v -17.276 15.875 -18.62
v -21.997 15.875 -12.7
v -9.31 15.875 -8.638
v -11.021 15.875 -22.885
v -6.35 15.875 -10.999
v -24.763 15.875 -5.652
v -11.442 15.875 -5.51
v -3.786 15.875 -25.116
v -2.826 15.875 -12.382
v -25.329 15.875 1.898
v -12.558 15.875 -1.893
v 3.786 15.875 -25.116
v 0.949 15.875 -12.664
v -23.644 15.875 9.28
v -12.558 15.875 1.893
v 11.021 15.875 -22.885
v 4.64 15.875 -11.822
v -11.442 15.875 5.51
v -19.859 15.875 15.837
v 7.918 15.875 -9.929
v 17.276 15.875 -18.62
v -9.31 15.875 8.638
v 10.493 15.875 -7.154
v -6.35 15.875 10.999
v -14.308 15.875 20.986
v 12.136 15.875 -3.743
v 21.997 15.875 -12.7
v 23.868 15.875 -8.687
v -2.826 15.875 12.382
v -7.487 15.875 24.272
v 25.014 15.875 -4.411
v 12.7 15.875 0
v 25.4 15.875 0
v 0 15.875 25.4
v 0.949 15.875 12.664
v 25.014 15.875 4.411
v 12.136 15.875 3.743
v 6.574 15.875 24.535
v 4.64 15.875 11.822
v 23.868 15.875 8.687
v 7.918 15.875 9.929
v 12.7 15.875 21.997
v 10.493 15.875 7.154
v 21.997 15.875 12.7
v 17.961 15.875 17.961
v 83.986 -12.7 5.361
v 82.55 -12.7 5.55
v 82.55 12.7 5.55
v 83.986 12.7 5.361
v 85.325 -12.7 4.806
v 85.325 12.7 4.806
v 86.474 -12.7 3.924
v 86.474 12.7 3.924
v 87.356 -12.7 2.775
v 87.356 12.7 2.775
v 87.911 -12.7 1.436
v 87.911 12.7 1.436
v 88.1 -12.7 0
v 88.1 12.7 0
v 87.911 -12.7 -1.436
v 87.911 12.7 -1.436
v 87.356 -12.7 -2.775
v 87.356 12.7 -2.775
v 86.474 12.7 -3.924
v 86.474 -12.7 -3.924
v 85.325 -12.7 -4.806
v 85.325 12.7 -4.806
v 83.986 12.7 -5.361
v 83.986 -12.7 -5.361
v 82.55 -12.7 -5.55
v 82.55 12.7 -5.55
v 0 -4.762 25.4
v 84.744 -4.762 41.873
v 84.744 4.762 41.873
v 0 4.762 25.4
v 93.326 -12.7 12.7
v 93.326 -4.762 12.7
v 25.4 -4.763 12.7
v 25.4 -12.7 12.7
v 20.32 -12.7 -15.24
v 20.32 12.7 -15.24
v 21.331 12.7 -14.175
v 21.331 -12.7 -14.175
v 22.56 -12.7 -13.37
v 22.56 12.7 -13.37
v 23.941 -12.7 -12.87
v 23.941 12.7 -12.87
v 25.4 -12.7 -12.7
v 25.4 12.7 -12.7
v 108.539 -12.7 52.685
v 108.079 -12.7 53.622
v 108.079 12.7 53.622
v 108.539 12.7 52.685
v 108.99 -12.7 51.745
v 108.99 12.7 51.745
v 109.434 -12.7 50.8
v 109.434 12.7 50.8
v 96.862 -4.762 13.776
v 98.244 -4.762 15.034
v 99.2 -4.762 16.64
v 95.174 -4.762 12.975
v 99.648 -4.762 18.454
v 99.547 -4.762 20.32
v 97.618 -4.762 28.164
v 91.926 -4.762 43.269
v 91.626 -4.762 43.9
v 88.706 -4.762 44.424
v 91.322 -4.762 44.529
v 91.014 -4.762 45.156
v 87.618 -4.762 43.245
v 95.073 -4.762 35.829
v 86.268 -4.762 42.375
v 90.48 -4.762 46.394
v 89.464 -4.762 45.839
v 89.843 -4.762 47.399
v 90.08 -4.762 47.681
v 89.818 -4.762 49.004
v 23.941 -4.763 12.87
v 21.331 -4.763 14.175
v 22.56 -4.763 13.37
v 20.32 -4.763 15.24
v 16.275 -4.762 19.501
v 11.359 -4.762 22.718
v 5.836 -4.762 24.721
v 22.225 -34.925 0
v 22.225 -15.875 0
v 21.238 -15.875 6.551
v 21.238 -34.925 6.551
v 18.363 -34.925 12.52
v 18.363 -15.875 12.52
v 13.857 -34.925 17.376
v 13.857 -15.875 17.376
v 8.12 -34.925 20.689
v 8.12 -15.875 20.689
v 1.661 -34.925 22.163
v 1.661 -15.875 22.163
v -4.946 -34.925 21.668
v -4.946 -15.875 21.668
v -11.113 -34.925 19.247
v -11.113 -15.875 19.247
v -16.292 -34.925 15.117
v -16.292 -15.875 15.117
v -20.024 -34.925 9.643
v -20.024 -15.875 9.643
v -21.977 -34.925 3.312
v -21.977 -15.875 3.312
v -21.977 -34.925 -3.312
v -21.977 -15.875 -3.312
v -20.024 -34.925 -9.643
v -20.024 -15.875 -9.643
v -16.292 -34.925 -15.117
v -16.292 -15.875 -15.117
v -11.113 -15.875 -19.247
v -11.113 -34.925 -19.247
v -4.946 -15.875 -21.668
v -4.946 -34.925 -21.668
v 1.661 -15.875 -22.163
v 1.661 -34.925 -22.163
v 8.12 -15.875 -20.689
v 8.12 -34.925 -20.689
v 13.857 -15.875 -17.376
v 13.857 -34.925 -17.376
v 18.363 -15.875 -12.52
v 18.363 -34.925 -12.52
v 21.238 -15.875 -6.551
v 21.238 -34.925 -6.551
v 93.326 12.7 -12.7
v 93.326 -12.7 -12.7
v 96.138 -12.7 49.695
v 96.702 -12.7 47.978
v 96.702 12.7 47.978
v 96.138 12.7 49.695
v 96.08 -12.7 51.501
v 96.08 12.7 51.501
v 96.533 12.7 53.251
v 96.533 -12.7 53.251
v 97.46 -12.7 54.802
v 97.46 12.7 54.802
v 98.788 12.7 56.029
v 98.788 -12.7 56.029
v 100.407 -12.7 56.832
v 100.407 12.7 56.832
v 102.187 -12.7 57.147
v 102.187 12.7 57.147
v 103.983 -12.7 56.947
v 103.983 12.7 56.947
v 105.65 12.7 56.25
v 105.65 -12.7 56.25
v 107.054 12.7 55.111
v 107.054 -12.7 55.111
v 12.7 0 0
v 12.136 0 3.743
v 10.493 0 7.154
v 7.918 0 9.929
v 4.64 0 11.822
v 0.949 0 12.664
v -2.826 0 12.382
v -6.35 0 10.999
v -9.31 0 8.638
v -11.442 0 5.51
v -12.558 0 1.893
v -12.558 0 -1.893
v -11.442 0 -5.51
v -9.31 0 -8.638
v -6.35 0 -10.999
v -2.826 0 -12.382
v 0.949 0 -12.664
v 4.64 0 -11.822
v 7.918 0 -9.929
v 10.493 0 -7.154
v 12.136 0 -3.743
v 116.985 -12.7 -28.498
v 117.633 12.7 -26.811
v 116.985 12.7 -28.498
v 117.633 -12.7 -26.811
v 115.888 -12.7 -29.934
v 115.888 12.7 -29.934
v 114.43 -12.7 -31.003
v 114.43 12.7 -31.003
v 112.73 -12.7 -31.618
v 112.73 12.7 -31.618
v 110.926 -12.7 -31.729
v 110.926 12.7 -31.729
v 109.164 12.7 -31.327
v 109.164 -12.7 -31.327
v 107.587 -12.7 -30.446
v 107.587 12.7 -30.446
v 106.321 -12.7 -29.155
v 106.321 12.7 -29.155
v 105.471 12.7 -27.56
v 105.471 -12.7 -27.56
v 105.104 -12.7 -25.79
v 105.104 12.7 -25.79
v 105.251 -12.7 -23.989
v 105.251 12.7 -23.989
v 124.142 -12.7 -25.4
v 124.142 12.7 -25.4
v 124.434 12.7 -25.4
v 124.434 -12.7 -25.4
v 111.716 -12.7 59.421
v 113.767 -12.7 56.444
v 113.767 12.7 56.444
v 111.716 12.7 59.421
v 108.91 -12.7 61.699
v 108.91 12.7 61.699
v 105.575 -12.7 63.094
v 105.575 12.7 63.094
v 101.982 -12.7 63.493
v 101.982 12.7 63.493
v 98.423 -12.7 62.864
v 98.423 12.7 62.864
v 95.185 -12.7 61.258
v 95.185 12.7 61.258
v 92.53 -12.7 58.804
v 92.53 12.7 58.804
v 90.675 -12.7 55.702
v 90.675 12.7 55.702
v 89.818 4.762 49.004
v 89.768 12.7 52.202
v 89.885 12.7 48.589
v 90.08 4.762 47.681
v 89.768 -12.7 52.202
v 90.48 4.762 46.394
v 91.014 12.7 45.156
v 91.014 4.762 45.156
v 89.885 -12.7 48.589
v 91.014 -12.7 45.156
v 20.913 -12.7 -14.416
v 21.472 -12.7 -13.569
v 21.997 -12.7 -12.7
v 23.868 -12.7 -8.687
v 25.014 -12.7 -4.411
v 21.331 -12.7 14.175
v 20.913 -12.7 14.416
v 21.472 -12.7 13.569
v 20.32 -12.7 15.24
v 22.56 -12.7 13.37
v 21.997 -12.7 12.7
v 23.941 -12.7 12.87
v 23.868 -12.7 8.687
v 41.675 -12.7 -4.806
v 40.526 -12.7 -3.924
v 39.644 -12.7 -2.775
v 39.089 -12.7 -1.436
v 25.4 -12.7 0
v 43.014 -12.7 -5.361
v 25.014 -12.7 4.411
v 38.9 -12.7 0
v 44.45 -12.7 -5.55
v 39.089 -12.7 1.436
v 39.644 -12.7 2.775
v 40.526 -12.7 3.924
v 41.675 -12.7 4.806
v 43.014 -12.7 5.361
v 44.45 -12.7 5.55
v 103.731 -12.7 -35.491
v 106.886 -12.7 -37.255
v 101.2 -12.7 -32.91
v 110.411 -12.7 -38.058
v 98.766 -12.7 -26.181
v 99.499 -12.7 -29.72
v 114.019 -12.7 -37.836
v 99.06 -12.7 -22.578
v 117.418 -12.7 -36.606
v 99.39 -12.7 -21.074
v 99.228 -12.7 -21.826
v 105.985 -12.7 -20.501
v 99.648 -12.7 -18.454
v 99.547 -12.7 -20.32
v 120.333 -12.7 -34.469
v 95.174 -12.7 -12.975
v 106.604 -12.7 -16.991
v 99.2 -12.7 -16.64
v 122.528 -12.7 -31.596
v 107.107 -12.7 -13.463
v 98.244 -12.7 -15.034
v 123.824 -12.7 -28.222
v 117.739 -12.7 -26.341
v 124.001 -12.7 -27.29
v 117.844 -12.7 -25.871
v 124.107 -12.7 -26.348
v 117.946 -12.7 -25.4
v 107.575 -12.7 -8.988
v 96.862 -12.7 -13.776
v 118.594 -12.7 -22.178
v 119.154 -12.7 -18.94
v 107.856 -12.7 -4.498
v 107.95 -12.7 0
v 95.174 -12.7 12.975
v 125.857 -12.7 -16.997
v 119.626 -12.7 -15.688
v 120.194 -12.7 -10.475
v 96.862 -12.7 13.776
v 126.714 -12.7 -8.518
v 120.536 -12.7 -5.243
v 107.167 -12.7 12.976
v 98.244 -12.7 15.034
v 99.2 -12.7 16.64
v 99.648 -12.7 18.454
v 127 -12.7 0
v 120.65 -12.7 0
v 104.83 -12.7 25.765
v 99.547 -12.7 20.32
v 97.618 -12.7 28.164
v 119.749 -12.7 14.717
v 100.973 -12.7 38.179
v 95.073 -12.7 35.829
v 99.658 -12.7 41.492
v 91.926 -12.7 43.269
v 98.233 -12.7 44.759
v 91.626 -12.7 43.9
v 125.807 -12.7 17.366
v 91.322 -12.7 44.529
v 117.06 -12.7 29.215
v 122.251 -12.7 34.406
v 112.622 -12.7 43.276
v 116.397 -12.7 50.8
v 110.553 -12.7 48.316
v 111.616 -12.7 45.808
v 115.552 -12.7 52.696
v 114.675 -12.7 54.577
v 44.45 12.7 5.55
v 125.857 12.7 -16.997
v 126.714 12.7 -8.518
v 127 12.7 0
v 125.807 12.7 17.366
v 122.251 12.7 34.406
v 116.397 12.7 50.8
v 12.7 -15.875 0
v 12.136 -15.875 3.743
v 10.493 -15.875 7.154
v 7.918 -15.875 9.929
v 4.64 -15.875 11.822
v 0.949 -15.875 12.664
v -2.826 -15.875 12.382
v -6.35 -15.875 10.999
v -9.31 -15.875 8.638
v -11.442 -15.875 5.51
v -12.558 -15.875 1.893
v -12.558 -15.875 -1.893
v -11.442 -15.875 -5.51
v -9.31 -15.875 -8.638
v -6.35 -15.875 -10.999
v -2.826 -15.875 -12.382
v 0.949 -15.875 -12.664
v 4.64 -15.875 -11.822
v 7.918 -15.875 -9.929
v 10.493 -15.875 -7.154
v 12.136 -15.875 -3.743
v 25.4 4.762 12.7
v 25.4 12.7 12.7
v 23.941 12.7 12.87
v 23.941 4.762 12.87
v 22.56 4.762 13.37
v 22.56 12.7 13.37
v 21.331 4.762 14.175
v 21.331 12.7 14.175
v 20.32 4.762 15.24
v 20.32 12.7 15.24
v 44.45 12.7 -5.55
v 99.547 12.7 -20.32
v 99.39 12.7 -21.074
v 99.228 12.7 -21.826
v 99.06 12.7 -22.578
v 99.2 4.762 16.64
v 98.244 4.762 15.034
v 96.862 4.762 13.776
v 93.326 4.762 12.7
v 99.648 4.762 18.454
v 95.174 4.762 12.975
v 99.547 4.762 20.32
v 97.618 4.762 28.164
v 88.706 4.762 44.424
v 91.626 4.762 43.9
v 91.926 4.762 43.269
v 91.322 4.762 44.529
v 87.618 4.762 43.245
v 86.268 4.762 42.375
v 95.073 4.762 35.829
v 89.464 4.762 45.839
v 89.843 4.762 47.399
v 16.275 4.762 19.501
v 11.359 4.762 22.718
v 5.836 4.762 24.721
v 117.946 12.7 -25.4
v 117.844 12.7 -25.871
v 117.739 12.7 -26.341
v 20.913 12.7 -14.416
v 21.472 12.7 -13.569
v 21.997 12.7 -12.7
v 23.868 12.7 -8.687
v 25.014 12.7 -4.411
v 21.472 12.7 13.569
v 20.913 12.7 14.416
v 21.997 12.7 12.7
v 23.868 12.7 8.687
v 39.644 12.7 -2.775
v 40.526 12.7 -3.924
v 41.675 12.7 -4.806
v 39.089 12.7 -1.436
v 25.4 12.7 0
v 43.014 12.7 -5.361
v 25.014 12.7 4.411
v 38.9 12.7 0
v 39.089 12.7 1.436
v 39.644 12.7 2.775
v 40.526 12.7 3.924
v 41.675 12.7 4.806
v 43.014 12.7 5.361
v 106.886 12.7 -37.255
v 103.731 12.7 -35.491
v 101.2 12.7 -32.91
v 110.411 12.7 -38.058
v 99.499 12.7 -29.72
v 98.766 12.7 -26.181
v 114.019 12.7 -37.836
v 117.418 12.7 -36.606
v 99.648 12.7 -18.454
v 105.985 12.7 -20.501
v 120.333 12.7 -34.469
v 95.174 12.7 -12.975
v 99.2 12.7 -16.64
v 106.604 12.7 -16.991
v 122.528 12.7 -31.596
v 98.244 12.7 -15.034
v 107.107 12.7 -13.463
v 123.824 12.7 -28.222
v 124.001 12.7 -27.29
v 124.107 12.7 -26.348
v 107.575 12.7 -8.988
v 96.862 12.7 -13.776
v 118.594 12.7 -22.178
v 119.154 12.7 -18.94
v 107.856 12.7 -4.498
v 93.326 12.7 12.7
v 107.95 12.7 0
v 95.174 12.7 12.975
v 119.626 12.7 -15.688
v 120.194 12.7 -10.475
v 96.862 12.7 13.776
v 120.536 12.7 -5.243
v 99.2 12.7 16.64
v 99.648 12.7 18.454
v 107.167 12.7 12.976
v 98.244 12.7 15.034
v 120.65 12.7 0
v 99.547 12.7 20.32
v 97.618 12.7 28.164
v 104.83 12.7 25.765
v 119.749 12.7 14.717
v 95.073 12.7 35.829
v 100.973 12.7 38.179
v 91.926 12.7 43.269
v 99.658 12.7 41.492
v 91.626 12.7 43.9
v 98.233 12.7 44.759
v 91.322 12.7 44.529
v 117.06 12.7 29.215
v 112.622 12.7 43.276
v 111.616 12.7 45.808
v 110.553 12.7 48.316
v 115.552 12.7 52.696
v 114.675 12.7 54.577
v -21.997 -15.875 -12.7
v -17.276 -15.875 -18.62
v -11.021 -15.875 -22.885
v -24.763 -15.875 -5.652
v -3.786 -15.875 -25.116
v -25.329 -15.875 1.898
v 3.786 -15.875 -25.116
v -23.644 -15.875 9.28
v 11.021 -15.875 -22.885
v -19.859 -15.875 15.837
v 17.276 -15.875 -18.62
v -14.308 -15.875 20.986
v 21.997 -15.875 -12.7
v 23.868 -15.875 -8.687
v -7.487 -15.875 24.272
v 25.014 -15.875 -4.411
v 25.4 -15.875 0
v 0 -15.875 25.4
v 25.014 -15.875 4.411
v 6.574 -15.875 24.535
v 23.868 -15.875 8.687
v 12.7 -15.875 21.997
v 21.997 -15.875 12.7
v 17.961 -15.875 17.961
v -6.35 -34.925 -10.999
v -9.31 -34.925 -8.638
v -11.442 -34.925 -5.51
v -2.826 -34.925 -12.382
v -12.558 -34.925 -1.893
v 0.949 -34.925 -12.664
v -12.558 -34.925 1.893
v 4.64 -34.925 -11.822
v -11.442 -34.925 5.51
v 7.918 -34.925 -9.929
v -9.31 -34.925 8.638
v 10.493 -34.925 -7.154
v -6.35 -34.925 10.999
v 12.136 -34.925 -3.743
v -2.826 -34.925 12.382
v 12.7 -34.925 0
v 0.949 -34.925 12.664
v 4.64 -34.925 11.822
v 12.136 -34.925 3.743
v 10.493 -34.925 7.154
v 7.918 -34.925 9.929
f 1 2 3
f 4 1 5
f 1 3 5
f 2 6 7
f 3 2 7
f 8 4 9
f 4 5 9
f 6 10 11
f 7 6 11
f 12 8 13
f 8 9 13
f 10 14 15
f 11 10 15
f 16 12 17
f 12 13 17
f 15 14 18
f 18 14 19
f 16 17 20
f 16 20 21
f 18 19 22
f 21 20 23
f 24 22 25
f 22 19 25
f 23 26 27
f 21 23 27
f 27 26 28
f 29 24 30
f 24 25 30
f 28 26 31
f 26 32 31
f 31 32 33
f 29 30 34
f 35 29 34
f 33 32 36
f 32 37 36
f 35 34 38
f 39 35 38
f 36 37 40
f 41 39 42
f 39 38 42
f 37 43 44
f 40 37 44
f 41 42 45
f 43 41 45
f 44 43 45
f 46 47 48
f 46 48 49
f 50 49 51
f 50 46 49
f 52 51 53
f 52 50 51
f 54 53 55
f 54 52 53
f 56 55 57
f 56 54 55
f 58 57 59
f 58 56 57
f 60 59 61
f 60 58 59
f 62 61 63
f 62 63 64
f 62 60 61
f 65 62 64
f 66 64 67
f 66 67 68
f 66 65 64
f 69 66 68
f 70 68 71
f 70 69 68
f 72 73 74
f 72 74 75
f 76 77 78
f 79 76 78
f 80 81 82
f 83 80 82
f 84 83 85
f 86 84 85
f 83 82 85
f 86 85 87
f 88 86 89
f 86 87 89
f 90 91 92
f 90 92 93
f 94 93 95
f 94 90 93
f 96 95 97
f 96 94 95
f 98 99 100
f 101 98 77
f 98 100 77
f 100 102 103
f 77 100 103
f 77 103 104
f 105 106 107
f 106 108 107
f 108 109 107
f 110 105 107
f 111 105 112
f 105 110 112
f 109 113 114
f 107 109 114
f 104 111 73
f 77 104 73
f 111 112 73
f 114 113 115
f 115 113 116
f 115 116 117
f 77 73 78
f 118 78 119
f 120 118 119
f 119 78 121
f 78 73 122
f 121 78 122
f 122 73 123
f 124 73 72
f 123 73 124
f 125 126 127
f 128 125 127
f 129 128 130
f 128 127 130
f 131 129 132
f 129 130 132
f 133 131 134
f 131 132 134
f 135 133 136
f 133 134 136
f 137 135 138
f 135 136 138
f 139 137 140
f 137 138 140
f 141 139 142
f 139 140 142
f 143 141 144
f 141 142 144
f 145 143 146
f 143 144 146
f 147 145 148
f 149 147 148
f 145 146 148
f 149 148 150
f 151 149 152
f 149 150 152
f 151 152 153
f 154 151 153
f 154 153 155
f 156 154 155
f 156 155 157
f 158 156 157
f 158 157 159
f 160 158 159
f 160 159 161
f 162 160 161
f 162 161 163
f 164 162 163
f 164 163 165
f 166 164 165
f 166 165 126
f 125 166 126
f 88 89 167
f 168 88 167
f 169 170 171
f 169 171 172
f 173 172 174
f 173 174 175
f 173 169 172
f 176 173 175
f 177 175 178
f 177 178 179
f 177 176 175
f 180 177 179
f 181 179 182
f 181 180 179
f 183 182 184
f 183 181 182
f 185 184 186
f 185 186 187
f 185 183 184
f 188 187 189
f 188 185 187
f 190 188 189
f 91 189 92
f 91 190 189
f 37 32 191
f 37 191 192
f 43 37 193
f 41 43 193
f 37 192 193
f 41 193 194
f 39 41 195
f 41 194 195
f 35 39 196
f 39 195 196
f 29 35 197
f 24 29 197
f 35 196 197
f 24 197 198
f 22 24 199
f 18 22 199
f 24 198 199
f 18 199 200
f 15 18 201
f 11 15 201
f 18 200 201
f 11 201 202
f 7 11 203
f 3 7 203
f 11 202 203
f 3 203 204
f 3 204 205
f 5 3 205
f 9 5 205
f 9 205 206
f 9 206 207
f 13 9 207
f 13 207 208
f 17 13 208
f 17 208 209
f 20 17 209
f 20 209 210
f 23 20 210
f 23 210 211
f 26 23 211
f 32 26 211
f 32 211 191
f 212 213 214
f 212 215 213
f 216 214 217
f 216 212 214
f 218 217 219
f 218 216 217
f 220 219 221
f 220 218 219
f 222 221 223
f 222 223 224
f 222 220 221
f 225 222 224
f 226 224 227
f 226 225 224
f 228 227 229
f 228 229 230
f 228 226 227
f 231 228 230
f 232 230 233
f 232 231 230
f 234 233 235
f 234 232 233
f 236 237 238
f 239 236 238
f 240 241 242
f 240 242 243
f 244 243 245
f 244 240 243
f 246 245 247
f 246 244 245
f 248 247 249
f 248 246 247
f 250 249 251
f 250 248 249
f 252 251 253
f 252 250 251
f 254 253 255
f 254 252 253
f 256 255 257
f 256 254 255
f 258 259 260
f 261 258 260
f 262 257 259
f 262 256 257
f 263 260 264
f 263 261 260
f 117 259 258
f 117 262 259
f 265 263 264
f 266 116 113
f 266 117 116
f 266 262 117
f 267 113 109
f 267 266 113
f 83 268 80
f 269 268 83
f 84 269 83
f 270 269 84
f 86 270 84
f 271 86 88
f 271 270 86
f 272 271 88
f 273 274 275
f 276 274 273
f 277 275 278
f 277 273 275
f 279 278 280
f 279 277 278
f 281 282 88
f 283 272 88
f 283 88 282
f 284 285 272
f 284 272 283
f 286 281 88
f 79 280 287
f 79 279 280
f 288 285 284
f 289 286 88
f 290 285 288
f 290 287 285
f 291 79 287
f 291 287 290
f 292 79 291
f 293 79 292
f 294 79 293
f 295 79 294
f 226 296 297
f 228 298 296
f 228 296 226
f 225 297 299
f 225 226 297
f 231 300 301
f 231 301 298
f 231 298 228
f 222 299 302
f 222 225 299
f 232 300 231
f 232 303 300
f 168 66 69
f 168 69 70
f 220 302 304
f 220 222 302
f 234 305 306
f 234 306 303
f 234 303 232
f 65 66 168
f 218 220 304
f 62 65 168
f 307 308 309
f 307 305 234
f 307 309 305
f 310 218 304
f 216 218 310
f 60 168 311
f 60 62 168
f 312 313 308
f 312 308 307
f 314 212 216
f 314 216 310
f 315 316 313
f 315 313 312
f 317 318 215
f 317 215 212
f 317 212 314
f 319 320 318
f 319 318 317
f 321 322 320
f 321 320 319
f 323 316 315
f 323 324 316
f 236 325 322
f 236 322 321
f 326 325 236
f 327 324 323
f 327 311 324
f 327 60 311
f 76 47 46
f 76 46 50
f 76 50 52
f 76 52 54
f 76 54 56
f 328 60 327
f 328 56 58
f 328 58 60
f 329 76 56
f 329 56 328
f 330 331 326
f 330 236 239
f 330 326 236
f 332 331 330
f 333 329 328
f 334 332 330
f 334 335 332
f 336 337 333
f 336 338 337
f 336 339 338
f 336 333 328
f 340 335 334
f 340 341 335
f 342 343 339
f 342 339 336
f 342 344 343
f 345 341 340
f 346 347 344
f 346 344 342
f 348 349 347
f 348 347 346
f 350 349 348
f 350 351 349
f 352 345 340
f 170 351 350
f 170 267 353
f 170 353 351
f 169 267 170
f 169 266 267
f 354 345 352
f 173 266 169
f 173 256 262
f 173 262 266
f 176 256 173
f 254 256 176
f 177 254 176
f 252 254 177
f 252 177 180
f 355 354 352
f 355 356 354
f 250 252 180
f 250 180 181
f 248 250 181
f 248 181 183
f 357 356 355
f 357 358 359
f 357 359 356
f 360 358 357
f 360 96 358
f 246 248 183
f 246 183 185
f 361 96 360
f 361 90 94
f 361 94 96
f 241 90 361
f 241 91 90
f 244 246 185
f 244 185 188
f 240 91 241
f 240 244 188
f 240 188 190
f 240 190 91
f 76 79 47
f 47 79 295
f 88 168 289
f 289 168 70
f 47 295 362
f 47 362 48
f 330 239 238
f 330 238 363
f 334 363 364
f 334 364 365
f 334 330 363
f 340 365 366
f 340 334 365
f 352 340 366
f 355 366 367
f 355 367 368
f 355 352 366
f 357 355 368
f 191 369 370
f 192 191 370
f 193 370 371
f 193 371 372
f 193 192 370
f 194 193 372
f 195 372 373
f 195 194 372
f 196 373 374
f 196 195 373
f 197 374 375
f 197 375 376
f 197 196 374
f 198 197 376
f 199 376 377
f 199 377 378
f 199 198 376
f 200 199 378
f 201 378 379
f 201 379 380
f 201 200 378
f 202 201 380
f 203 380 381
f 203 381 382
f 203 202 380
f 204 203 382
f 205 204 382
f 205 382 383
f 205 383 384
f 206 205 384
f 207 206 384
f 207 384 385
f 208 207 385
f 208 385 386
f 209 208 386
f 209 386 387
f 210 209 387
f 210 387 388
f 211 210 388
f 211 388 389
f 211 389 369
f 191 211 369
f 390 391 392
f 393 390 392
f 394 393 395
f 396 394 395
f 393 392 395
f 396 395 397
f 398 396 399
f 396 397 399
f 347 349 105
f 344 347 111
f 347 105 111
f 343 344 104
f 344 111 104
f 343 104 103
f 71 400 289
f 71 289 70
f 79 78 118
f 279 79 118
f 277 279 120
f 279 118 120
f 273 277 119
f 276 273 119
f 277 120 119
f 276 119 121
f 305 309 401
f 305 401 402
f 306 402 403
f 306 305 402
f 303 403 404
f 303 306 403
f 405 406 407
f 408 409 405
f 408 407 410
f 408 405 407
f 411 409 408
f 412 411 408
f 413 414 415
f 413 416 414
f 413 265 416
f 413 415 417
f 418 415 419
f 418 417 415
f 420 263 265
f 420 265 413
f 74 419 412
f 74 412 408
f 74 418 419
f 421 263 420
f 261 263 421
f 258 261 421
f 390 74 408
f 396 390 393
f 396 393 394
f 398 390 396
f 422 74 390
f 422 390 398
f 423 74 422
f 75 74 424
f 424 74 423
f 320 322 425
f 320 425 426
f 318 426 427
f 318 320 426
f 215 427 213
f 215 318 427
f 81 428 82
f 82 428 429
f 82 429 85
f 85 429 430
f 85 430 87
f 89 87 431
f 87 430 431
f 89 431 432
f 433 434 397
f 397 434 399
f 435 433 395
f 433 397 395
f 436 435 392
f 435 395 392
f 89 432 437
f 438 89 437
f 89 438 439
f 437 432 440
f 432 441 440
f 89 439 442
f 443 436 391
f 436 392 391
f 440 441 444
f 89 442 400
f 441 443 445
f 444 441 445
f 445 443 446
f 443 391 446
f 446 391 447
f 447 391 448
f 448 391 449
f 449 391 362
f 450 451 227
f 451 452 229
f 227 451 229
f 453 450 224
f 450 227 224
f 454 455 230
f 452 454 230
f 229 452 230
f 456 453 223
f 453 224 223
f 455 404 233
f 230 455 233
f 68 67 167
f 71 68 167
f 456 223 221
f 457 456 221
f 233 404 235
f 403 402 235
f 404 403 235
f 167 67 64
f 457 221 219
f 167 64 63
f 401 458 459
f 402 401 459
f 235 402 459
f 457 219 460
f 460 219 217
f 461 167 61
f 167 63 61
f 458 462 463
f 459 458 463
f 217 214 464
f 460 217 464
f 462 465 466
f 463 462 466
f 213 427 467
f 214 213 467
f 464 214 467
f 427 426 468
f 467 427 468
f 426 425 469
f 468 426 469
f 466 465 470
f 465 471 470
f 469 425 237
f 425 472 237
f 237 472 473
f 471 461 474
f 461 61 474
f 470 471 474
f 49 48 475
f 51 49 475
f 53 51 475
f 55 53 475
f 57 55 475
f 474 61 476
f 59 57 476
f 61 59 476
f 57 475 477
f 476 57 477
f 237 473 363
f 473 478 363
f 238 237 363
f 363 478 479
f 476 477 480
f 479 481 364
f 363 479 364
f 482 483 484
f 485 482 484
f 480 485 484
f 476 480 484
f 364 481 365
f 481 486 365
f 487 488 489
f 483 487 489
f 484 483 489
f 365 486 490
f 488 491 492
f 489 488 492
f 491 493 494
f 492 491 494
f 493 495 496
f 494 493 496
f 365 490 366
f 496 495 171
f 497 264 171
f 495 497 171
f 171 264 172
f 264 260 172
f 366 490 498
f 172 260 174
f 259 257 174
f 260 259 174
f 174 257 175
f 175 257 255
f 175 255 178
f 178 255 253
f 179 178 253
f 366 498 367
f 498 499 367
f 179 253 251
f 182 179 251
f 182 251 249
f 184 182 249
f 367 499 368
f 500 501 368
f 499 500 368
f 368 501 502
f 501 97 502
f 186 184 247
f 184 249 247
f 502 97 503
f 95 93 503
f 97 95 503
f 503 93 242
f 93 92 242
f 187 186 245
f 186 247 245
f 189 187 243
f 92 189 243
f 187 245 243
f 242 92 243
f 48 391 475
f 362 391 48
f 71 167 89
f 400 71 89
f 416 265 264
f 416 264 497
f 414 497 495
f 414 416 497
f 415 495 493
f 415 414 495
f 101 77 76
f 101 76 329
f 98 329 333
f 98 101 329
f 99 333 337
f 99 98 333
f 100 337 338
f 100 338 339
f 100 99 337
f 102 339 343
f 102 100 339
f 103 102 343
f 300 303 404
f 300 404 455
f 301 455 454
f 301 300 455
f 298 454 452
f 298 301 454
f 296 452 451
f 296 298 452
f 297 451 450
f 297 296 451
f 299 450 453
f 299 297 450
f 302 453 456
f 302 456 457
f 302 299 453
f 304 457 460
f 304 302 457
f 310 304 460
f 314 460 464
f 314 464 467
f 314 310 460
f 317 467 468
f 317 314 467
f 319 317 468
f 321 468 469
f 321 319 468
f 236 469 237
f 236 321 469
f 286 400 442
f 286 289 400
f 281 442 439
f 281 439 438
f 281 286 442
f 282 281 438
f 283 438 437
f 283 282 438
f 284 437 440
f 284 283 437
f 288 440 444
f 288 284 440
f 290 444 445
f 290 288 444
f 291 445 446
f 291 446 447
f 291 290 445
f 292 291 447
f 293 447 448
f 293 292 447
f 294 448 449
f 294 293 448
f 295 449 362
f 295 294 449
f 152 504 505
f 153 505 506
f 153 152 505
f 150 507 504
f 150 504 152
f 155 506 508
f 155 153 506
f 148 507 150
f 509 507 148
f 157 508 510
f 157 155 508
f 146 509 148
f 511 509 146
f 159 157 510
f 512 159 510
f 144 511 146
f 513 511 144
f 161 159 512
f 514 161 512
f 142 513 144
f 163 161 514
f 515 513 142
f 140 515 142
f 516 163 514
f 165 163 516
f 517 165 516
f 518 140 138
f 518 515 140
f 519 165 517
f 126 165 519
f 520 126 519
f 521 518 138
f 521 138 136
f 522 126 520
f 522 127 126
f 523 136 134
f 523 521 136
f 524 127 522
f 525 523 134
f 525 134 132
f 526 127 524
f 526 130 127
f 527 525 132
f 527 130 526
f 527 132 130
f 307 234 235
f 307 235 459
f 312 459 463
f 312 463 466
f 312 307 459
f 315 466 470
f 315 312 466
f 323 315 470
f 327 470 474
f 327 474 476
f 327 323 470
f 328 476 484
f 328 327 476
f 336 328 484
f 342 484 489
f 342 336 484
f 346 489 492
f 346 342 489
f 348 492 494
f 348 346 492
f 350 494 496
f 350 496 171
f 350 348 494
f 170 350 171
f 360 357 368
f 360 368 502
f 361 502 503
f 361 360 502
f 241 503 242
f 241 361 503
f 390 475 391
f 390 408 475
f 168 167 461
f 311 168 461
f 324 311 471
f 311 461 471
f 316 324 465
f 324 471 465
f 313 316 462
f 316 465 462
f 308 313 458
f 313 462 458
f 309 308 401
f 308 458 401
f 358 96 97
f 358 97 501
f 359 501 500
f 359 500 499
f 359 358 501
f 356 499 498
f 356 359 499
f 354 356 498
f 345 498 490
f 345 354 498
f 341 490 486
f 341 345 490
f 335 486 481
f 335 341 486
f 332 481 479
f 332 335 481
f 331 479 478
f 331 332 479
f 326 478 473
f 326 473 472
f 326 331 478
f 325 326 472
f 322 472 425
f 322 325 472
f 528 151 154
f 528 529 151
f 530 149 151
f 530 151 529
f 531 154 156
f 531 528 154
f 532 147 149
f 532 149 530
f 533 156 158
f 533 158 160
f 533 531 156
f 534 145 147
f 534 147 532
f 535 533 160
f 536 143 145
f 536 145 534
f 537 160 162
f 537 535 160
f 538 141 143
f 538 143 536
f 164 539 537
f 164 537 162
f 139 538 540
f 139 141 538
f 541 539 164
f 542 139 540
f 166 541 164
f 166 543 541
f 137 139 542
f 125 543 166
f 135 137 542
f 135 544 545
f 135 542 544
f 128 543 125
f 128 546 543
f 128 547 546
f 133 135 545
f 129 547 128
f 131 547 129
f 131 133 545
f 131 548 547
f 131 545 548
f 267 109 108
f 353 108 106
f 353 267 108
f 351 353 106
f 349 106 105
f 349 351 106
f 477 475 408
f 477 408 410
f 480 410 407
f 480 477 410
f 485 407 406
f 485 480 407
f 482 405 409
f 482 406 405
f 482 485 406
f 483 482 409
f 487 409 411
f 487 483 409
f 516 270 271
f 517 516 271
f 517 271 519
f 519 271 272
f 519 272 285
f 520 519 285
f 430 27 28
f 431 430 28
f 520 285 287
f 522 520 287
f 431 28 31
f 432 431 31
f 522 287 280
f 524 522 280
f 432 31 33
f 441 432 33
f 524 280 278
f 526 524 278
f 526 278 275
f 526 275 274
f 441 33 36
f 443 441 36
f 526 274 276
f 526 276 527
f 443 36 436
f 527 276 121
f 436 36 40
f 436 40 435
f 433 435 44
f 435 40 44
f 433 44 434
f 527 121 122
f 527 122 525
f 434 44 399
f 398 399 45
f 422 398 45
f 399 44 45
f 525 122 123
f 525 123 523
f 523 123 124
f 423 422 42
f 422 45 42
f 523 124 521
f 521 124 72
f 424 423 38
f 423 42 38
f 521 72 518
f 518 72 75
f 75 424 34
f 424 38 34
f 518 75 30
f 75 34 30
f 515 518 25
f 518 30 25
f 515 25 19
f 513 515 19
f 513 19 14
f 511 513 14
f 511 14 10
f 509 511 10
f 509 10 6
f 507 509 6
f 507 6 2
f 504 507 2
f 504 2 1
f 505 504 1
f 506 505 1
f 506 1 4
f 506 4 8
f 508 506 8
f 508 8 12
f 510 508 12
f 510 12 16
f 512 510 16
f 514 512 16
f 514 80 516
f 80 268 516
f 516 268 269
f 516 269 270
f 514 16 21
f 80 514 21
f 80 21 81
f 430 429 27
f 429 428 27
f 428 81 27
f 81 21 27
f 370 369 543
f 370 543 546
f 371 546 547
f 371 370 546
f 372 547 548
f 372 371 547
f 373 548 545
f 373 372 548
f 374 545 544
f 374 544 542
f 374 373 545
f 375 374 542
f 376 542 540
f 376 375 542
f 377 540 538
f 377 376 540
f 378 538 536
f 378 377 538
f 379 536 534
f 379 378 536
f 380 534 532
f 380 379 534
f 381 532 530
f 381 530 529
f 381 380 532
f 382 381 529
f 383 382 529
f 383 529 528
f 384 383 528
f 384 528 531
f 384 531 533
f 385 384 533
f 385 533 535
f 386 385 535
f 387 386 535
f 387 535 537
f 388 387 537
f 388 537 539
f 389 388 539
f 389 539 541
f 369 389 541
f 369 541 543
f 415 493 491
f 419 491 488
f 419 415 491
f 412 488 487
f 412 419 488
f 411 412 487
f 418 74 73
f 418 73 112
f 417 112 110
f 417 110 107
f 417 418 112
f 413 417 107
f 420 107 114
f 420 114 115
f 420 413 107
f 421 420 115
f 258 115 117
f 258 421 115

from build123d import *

# Parameters (mm, degrees)
F0_W         = 38.1
F0_H         = 7.1501
F0_R         = 22.225
F0_R_2       = 12.7
F1_DEPTH     = 12.7
F2_DEPTH     = 15.875
F3_DEPTH     = 4.7625
F5_DEPTH     = 34.925
F6_T1_DEPTH  = 9.525
F6_T3_DEPTH  = 25.4
F6_T5_DEPTH  = 16.4448868597
F6_T7_DEPTH  = 16.4448868597
F6_T12_DEPTH = 27.2444917505
F6_T17_DEPTH = 27.2444917505


# Not quite as in the source:
# - a fillet or chamfer that OpenCascade refuses, or shapes differently, is made with other operations: its cross-section is extruded or revolved along the edge and cut away or added


with BuildPart() as f1:
    # F0 (on Front) → F1 (new body)
    with BuildSketch(Plane.XZ):
        with BuildLine():
            ThreePointArc((113.7674148927, 56.4444444444), (96.7462289589, 62.1767414893), (91.0139319141, 45.1555555556))
            ThreePointArc((91.0139319141, 45.1555555556), (95.1042946992, 40.3981402923), (100.9729543694, 38.1793790668))
            ThreePointArc((100.9729543694, 38.1793790668), (98.95897617, 43.1314680412), (96.7023026588, 47.9777777778))
            ThreePointArc((96.7023026588, 47.9777777778), (99.5684511812, 56.4883707446), (108.079044148, 53.6222222222))
            ThreePointArc((108.079044148, 53.6222222222), (108.7656354529, 52.2155057864), (109.4339184165, 50.8))
            Line((109.4339184165, 50.8), (115.0906734034, 50.8))
            ThreePointArc((115.0906734034, 50.8), (114.7554341555, 53.6987396474), (113.7674148927, 56.4444444444))
        make_face()
        with BuildLine():
            ThreePointArc((91.0139319141, 45.1555555556), (91.4748276489, 44.2144309769), (91.9259920573, 43.2686027539))
            ThreePointArc((91.9259920573, 43.2686027539), (97.5691447351, 28.3341136382), (100.8031249516, 12.7))
            ThreePointArc((100.8031249516, 12.7), (101.4005855384, 6.3624879144), (101.6, 0))
            Line((101.6, 0), (107.95, 0))
            ThreePointArc((107.95, 0), (106.1914142579, 19.405824845), (100.9729543694, 38.1793790668))
            ThreePointArc((100.9729543694, 38.1793790668), (95.1042946992, 40.3981402923), (91.0139319141, 45.1555555556))
        make_face()
        with BuildLine():
            ThreePointArc((101.6, 0), (101.4005855384, -6.3624879144), (100.8031249516, -12.7))
            ThreePointArc((100.8031249516, -12.7), (100.0533339134, -17.6604182514), (99.0595979732, -22.5777777778))
            ThreePointArc((99.0595979732, -22.5777777778), (101.9216501545, -16.9945237972), (107.1072287434, -13.462691072))
            ThreePointArc((107.1072287434, -13.462691072), (107.7391011724, -6.744522116), (107.95, 0))
            Line((107.95, 0), (101.6, 0))
        make_face()
        with BuildLine():
            ThreePointArc((124.4340789334, -25.4), (126.3568914317, -12.7646381747), (127, 0))
            Line((127, 0), (120.65, 0))
            ThreePointArc((120.65, 0), (120.3936458808, -7.8608225729), (119.625672913, -15.6882401853))
            ThreePointArc((119.625672913, -15.6882401853), (122.957733543, -20.0447240945), (124.1420477199, -25.4))
            Line((124.1420477199, -25.4), (124.4340789334, -25.4))
        make_face()
        with BuildLine():
            Line((116.3974226519, 50.8), (115.0906734034, 50.8))
            ThreePointArc((115.0906734034, 50.8), (114.4576498997, 46.8404446919), (112.6216847044, 43.2756124663))
            ThreePointArc((112.6216847044, 43.2756124663), (118.6259431145, 22.0070016178), (120.65, 0))
            Line((120.65, 0), (127, 0))
            ThreePointArc((127, 0), (124.3211017422, 25.9473247485), (116.3974226519, 50.8))
        make_face()
        with BuildLine():
            Line((117.9460151934, -25.4), (124.1420477199, -25.4))
            ThreePointArc((124.1420477199, -25.4), (122.957733543, -20.0447240945), (119.625672913, -15.6882401853))
            ThreePointArc((119.625672913, -15.6882401853), (118.885055062, -20.5612787271), (117.9460151934, -25.4))
        make_face()
        with BuildLine():
            ThreePointArc((107.1072287434, -13.462691072), (101.9216501545, -16.9945237972), (99.0595979732, -22.5777777778))
            ThreePointArc((99.0595979732, -22.5777777778), (108.6198254977, -37.7824497467), (123.8244974665, -28.2222222222))
            ThreePointArc((123.8244974665, -28.2222222222), (124.0624104679, -26.8200155312), (124.1420477199, -25.4))
            Line((124.1420477199, -25.4), (117.9460151934, -25.4))
            ThreePointArc((117.9460151934, -25.4), (117.791757, -26.1060238805), (117.6332725932, -26.8111111111))
            ThreePointArc((117.6332725932, -26.8111111111), (110.0309366088, -31.5912248733), (105.2508228466, -23.9888888889))
            ThreePointArc((105.2508228466, -23.9888888889), (106.3093868334, -18.7487805232), (107.1072287434, -13.462691072))
        make_face()
        with BuildLine():
            ThreePointArc((112.6216847044, 43.2756124663), (114.4576498997, 46.8404446919), (115.0906734034, 50.8))
            Line((115.0906734034, 50.8), (109.4339184165, 50.8))
            ThreePointArc((109.4339184165, 50.8), (111.091524525, 47.064802971), (112.6216847044, 43.2756124663))
        make_face()
        with BuildLine():
            ThreePointArc((116.3974226519, 50.8), (115.1170189362, 53.6383440391), (113.7674148927, 56.4444444444))
            ThreePointArc((113.7674148927, 56.4444444444), (114.7554341555, 53.6987396474), (115.0906734034, 50.8))
            Line((115.0906734034, 50.8), (116.3974226519, 50.8))
        make_face()
        with BuildLine():
            ThreePointArc((21.9970452561, 12.7), (24.5345159877, 6.5740037456), (25.4, 0))
            Line((25.4, 0), (38.9001, 0))
            ThreePointArc((38.9001, 0), (40.5256280751, 3.9243719249), (44.45, 5.5499))
            Line((44.45, 5.5499), (44.45, 12.7))
            Line((44.45, 12.7), (21.9970452561, 12.7))
        make_face()
        with Locations((63.5, 9.12495)):
            Rectangle(F0_W, F0_H)
        with BuildLine():
            Line((82.55, 12.7), (82.55, 5.5499))
            ThreePointArc((82.55, 5.5499), (86.4743719249, 3.9243719249), (88.0999, 0))
            Line((88.0999, 0), (101.6, 0))
            ThreePointArc((101.6, 0), (101.4005855384, 6.3624879144), (100.8031249516, 12.7))
            Line((100.8031249516, 12.7), (82.55, 12.7))
        make_face()
        with BuildLine():
            ThreePointArc((88.0999, 0), (86.4743719249, -3.9243719249), (82.55, -5.5499))
            Line((82.55, -5.5499), (82.55, -12.7))
            Line((82.55, -12.7), (100.8031249516, -12.7))
            ThreePointArc((100.8031249516, -12.7), (101.4005855384, -6.3624879144), (101.6, 0))
            Line((101.6, 0), (88.0999, 0))
        make_face()
        with Locations((63.5, -9.12495)):
            Rectangle(F0_W, F0_H)
        with BuildLine():
            Line((38.9001, 0), (25.4, 0))
            ThreePointArc((25.4, 0), (24.5345159877, -6.5740037456), (21.9970452561, -12.7))
            Line((21.9970452561, -12.7), (44.45, -12.7))
            Line((44.45, -12.7), (44.45, -5.5499))
            ThreePointArc((44.45, -5.5499), (40.5256280751, -3.9243719249), (38.9001, 0))
        make_face()
        with BuildLine():
            ThreePointArc((21.9970452561, -12.7), (24.5345159877, -6.5740037456), (25.4, 0))
            ThreePointArc((25.4, 0), (24.5345159877, 6.5740037456), (21.9970452561, 12.7))
            ThreePointArc((21.9970452561, 12.7), (12.7, 21.9970452561), (0, 25.4))
            ThreePointArc((0, 25.4), (-21.9970452561, -12.7), (21.9970452561, -12.7))
        make_face()
        Circle(F0_R, mode=Mode.SUBTRACT)
        Circle(F0_R)
        Circle(F0_R_2, mode=Mode.SUBTRACT)
    extrude(amount=F1_DEPTH)

    # F0 (on Front) → F2 (join)
    with BuildSketch(Plane.XZ):
        with BuildLine():
            ThreePointArc((21.9970452561, -12.7), (24.5345159877, -6.5740037456), (25.4, 0))
            ThreePointArc((25.4, 0), (24.5345159877, 6.5740037456), (21.9970452561, 12.7))
            ThreePointArc((21.9970452561, 12.7), (12.7, 21.9970452561), (0, 25.4))
            ThreePointArc((0, 25.4), (-21.9970452561, -12.7), (21.9970452561, -12.7))
        make_face()
        Circle(F0_R, mode=Mode.SUBTRACT)
        Circle(F0_R)
        Circle(F0_R_2, mode=Mode.SUBTRACT)
    extrude(amount=F2_DEPTH)

    # F0 (on Front) → F3 (join)
    with BuildSketch(Plane.XZ):
        with BuildLine():
            ThreePointArc((0, 25.4), (12.7, 21.9970452561), (21.9970452561, 12.7))
            Line((21.9970452561, 12.7), (44.45, 12.7))
            Line((44.45, 12.7), (82.55, 12.7))
            Line((82.55, 12.7), (100.8031249516, 12.7))
            ThreePointArc((100.8031249516, 12.7), (97.5691447351, 28.3341136382), (91.9259920573, 43.2686027539))
            Line((91.9259920573, 43.2686027539), (0, 25.4))
        make_face()
    extrude(amount=F3_DEPTH)

    # F4: F1 across face


with BuildPart() as f1_1:
    add(f1.part)
    add(f1.part.mirror(Plane.XZ))

    # F0 (on Front) → F5 (join)
    with BuildSketch(Plane.XZ):
        Circle(F0_R)
        Circle(F0_R_2, mode=Mode.SUBTRACT)
    extrude(amount=F5_DEPTH)

    # F6: fillet of radius 6.35 on 7 edges, made by hand

    # F6_s2 → F6_t1 (join)
    with BuildSketch(Plane.XZ.offset(-4.7625)):
        with BuildLine():
            ThreePointArc((84.7437823747, 41.8725226155), (88.7059686824, 44.4242725365), (89.8183213038, 49.0039034869))
            Line((89.8183213038, 49.0039034869), (90.4469389088, 49.0937083126))
            ThreePointArc((90.4469389088, 49.0937083126), (91.5827689886, 45.4377777778), (92.5005295077, 43.5390315211))
            Line((92.5005295077, 43.5390315211), (92.0471557694, 42.6452694924))
            Line((92.0471557694, 42.6452694924), (84.8649460867, 41.249189354))
            Line((84.8649460867, 41.249189354), (84.7437823747, 41.8725226155))
        make_face()
    extrude(amount=F6_T1_DEPTH)

    # F6_s4 → F6_t3 (join)
    with BuildSketch(Plane.XZ.offset(-12.7)):
        with BuildLine():
            ThreePointArc((93.3255592, -12.7), (98.2442480497, -15.0339073716), (99.5472631467, -20.32))
            ThreePointArc((99.5472631467, -20.32), (100.247621432, -16.5219368483), (100.8031249516, -12.7))
            Line((100.8031249516, -12.7), (93.3255592, -12.7))
        make_face()
        with BuildLine():
            ThreePointArc((20.32, -15.24), (22.5601936686, -13.3703873372), (25.4, -12.7))
            Line((25.4, -12.7), (21.9970452561, -12.7))
            ThreePointArc((21.9970452561, -12.7), (21.1966030251, -13.9951427359), (20.32, -15.24))
        make_face()
    extrude(amount=F6_T3_DEPTH)

    # F6_s6 → F6_t5 (join)
    with BuildSketch(Plane.XZ.offset(-3.7448868597)):
        with BuildLine():
            ThreePointArc((25.4, 12.7), (22.5601936686, 13.3703873372), (20.32, 15.24))
            ThreePointArc((20.32, 15.24), (21.1966030251, 13.9951427359), (21.9970452561, 12.7))
            Line((21.9970452561, 12.7), (25.4, 12.7))
        make_face()
    extrude(amount=F6_T5_DEPTH)

    # F6_s8 → F6_t7 (join)
    with BuildSketch(Plane.XZ.offset(-12.7)):
        with BuildLine():
            ThreePointArc((25.4, 12.7), (22.5601936686, 13.3703873372), (20.32, 15.24))
            ThreePointArc((20.32, 15.24), (21.1966030251, 13.9951427359), (21.9970452561, 12.7))
            Line((21.9970452561, 12.7), (25.4, 12.7))
        make_face()
    extrude(amount=F6_T7_DEPTH)


with BuildPart() as f6_tool10:
    # F6_s11 → F6_t12 (new body)
    with BuildSketch(Plane.XZ.offset(-14.5444917505)):
        with BuildLine():
            ThreePointArc((93.3255592, 12.7), (98.2442480497, 15.0339073716), (99.5472631467, 20.32))
            ThreePointArc((99.5472631467, 20.32), (100.247621432, 16.5219368483), (100.8031249516, 12.7))
            Line((100.8031249516, 12.7), (93.3255592, 12.7))
        make_face()
    extrude(amount=F6_T12_DEPTH)

    split(bisect_by=Plane.XZ.offset(-12.7), keep=Keep.TOP)


with BuildPart() as f1_2:
    add(f1_1.part)

    # F6_t9: union F6_tool10
    add(f6_tool10.part)


with BuildPart() as f6_tool15:
    # F6_s16 → F6_t17 (new body)
    with BuildSketch(Plane.XZ.offset(14.5444917505)):
        with BuildLine():
            ThreePointArc((93.3255592, 12.7), (98.2442480497, 15.0339073716), (99.5472631467, 20.32))
            ThreePointArc((99.5472631467, 20.32), (100.247621432, 16.5219368483), (100.8031249516, 12.7))
            Line((100.8031249516, 12.7), (93.3255592, 12.7))
        make_face()
    extrude(amount=-F6_T17_DEPTH)

    split(bisect_by=Plane.XZ.offset(12.7), keep=Keep.BOTTOM)


with BuildPart() as f1_3:
    add(f1_2.part)

    # F6_t14: union F6_tool15
    add(f6_tool15.part)


solid = f1_3.part
